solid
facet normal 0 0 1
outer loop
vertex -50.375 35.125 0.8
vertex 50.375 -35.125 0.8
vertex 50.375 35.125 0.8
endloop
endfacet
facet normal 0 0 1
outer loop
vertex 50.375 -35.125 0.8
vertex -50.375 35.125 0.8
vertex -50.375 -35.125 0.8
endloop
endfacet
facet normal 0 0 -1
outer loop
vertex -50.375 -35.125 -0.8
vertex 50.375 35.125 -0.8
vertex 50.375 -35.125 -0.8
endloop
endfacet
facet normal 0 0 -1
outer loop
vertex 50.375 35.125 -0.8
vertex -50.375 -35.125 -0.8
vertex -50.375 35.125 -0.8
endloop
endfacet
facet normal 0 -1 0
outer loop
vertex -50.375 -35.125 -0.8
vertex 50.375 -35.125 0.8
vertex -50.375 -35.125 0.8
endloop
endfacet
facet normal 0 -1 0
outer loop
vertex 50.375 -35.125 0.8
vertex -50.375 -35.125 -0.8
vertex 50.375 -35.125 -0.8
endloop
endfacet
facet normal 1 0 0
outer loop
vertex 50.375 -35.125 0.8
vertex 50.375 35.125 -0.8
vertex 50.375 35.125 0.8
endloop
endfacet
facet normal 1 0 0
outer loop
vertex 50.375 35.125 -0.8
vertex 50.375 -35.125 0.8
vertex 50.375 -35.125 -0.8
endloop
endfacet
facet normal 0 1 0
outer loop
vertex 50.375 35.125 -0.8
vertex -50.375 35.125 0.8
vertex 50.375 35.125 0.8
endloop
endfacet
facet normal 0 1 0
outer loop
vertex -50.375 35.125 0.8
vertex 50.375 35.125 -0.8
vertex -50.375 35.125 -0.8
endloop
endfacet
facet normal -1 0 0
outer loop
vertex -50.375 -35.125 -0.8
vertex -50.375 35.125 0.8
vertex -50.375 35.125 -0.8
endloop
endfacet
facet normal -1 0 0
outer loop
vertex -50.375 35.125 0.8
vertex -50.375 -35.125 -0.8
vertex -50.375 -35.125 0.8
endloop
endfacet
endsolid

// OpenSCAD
// Parameters
pcb_length = 100.75; //[50.375:201.5:0.25]
pcb_width = 70.25; //[35.125:140.5:0.25]
pcb_thickness = 1.6; //[0.8:3.2:0.1]

// Geometry
module pcb_plate() {
  color([0.0, 0.4, 0.2]) // Green color for PCB
  translate([0, 0, 0])
    cube([pcb_length, pcb_width, pcb_thickness], center=true);
}

// Final Output
pcb_plate();
